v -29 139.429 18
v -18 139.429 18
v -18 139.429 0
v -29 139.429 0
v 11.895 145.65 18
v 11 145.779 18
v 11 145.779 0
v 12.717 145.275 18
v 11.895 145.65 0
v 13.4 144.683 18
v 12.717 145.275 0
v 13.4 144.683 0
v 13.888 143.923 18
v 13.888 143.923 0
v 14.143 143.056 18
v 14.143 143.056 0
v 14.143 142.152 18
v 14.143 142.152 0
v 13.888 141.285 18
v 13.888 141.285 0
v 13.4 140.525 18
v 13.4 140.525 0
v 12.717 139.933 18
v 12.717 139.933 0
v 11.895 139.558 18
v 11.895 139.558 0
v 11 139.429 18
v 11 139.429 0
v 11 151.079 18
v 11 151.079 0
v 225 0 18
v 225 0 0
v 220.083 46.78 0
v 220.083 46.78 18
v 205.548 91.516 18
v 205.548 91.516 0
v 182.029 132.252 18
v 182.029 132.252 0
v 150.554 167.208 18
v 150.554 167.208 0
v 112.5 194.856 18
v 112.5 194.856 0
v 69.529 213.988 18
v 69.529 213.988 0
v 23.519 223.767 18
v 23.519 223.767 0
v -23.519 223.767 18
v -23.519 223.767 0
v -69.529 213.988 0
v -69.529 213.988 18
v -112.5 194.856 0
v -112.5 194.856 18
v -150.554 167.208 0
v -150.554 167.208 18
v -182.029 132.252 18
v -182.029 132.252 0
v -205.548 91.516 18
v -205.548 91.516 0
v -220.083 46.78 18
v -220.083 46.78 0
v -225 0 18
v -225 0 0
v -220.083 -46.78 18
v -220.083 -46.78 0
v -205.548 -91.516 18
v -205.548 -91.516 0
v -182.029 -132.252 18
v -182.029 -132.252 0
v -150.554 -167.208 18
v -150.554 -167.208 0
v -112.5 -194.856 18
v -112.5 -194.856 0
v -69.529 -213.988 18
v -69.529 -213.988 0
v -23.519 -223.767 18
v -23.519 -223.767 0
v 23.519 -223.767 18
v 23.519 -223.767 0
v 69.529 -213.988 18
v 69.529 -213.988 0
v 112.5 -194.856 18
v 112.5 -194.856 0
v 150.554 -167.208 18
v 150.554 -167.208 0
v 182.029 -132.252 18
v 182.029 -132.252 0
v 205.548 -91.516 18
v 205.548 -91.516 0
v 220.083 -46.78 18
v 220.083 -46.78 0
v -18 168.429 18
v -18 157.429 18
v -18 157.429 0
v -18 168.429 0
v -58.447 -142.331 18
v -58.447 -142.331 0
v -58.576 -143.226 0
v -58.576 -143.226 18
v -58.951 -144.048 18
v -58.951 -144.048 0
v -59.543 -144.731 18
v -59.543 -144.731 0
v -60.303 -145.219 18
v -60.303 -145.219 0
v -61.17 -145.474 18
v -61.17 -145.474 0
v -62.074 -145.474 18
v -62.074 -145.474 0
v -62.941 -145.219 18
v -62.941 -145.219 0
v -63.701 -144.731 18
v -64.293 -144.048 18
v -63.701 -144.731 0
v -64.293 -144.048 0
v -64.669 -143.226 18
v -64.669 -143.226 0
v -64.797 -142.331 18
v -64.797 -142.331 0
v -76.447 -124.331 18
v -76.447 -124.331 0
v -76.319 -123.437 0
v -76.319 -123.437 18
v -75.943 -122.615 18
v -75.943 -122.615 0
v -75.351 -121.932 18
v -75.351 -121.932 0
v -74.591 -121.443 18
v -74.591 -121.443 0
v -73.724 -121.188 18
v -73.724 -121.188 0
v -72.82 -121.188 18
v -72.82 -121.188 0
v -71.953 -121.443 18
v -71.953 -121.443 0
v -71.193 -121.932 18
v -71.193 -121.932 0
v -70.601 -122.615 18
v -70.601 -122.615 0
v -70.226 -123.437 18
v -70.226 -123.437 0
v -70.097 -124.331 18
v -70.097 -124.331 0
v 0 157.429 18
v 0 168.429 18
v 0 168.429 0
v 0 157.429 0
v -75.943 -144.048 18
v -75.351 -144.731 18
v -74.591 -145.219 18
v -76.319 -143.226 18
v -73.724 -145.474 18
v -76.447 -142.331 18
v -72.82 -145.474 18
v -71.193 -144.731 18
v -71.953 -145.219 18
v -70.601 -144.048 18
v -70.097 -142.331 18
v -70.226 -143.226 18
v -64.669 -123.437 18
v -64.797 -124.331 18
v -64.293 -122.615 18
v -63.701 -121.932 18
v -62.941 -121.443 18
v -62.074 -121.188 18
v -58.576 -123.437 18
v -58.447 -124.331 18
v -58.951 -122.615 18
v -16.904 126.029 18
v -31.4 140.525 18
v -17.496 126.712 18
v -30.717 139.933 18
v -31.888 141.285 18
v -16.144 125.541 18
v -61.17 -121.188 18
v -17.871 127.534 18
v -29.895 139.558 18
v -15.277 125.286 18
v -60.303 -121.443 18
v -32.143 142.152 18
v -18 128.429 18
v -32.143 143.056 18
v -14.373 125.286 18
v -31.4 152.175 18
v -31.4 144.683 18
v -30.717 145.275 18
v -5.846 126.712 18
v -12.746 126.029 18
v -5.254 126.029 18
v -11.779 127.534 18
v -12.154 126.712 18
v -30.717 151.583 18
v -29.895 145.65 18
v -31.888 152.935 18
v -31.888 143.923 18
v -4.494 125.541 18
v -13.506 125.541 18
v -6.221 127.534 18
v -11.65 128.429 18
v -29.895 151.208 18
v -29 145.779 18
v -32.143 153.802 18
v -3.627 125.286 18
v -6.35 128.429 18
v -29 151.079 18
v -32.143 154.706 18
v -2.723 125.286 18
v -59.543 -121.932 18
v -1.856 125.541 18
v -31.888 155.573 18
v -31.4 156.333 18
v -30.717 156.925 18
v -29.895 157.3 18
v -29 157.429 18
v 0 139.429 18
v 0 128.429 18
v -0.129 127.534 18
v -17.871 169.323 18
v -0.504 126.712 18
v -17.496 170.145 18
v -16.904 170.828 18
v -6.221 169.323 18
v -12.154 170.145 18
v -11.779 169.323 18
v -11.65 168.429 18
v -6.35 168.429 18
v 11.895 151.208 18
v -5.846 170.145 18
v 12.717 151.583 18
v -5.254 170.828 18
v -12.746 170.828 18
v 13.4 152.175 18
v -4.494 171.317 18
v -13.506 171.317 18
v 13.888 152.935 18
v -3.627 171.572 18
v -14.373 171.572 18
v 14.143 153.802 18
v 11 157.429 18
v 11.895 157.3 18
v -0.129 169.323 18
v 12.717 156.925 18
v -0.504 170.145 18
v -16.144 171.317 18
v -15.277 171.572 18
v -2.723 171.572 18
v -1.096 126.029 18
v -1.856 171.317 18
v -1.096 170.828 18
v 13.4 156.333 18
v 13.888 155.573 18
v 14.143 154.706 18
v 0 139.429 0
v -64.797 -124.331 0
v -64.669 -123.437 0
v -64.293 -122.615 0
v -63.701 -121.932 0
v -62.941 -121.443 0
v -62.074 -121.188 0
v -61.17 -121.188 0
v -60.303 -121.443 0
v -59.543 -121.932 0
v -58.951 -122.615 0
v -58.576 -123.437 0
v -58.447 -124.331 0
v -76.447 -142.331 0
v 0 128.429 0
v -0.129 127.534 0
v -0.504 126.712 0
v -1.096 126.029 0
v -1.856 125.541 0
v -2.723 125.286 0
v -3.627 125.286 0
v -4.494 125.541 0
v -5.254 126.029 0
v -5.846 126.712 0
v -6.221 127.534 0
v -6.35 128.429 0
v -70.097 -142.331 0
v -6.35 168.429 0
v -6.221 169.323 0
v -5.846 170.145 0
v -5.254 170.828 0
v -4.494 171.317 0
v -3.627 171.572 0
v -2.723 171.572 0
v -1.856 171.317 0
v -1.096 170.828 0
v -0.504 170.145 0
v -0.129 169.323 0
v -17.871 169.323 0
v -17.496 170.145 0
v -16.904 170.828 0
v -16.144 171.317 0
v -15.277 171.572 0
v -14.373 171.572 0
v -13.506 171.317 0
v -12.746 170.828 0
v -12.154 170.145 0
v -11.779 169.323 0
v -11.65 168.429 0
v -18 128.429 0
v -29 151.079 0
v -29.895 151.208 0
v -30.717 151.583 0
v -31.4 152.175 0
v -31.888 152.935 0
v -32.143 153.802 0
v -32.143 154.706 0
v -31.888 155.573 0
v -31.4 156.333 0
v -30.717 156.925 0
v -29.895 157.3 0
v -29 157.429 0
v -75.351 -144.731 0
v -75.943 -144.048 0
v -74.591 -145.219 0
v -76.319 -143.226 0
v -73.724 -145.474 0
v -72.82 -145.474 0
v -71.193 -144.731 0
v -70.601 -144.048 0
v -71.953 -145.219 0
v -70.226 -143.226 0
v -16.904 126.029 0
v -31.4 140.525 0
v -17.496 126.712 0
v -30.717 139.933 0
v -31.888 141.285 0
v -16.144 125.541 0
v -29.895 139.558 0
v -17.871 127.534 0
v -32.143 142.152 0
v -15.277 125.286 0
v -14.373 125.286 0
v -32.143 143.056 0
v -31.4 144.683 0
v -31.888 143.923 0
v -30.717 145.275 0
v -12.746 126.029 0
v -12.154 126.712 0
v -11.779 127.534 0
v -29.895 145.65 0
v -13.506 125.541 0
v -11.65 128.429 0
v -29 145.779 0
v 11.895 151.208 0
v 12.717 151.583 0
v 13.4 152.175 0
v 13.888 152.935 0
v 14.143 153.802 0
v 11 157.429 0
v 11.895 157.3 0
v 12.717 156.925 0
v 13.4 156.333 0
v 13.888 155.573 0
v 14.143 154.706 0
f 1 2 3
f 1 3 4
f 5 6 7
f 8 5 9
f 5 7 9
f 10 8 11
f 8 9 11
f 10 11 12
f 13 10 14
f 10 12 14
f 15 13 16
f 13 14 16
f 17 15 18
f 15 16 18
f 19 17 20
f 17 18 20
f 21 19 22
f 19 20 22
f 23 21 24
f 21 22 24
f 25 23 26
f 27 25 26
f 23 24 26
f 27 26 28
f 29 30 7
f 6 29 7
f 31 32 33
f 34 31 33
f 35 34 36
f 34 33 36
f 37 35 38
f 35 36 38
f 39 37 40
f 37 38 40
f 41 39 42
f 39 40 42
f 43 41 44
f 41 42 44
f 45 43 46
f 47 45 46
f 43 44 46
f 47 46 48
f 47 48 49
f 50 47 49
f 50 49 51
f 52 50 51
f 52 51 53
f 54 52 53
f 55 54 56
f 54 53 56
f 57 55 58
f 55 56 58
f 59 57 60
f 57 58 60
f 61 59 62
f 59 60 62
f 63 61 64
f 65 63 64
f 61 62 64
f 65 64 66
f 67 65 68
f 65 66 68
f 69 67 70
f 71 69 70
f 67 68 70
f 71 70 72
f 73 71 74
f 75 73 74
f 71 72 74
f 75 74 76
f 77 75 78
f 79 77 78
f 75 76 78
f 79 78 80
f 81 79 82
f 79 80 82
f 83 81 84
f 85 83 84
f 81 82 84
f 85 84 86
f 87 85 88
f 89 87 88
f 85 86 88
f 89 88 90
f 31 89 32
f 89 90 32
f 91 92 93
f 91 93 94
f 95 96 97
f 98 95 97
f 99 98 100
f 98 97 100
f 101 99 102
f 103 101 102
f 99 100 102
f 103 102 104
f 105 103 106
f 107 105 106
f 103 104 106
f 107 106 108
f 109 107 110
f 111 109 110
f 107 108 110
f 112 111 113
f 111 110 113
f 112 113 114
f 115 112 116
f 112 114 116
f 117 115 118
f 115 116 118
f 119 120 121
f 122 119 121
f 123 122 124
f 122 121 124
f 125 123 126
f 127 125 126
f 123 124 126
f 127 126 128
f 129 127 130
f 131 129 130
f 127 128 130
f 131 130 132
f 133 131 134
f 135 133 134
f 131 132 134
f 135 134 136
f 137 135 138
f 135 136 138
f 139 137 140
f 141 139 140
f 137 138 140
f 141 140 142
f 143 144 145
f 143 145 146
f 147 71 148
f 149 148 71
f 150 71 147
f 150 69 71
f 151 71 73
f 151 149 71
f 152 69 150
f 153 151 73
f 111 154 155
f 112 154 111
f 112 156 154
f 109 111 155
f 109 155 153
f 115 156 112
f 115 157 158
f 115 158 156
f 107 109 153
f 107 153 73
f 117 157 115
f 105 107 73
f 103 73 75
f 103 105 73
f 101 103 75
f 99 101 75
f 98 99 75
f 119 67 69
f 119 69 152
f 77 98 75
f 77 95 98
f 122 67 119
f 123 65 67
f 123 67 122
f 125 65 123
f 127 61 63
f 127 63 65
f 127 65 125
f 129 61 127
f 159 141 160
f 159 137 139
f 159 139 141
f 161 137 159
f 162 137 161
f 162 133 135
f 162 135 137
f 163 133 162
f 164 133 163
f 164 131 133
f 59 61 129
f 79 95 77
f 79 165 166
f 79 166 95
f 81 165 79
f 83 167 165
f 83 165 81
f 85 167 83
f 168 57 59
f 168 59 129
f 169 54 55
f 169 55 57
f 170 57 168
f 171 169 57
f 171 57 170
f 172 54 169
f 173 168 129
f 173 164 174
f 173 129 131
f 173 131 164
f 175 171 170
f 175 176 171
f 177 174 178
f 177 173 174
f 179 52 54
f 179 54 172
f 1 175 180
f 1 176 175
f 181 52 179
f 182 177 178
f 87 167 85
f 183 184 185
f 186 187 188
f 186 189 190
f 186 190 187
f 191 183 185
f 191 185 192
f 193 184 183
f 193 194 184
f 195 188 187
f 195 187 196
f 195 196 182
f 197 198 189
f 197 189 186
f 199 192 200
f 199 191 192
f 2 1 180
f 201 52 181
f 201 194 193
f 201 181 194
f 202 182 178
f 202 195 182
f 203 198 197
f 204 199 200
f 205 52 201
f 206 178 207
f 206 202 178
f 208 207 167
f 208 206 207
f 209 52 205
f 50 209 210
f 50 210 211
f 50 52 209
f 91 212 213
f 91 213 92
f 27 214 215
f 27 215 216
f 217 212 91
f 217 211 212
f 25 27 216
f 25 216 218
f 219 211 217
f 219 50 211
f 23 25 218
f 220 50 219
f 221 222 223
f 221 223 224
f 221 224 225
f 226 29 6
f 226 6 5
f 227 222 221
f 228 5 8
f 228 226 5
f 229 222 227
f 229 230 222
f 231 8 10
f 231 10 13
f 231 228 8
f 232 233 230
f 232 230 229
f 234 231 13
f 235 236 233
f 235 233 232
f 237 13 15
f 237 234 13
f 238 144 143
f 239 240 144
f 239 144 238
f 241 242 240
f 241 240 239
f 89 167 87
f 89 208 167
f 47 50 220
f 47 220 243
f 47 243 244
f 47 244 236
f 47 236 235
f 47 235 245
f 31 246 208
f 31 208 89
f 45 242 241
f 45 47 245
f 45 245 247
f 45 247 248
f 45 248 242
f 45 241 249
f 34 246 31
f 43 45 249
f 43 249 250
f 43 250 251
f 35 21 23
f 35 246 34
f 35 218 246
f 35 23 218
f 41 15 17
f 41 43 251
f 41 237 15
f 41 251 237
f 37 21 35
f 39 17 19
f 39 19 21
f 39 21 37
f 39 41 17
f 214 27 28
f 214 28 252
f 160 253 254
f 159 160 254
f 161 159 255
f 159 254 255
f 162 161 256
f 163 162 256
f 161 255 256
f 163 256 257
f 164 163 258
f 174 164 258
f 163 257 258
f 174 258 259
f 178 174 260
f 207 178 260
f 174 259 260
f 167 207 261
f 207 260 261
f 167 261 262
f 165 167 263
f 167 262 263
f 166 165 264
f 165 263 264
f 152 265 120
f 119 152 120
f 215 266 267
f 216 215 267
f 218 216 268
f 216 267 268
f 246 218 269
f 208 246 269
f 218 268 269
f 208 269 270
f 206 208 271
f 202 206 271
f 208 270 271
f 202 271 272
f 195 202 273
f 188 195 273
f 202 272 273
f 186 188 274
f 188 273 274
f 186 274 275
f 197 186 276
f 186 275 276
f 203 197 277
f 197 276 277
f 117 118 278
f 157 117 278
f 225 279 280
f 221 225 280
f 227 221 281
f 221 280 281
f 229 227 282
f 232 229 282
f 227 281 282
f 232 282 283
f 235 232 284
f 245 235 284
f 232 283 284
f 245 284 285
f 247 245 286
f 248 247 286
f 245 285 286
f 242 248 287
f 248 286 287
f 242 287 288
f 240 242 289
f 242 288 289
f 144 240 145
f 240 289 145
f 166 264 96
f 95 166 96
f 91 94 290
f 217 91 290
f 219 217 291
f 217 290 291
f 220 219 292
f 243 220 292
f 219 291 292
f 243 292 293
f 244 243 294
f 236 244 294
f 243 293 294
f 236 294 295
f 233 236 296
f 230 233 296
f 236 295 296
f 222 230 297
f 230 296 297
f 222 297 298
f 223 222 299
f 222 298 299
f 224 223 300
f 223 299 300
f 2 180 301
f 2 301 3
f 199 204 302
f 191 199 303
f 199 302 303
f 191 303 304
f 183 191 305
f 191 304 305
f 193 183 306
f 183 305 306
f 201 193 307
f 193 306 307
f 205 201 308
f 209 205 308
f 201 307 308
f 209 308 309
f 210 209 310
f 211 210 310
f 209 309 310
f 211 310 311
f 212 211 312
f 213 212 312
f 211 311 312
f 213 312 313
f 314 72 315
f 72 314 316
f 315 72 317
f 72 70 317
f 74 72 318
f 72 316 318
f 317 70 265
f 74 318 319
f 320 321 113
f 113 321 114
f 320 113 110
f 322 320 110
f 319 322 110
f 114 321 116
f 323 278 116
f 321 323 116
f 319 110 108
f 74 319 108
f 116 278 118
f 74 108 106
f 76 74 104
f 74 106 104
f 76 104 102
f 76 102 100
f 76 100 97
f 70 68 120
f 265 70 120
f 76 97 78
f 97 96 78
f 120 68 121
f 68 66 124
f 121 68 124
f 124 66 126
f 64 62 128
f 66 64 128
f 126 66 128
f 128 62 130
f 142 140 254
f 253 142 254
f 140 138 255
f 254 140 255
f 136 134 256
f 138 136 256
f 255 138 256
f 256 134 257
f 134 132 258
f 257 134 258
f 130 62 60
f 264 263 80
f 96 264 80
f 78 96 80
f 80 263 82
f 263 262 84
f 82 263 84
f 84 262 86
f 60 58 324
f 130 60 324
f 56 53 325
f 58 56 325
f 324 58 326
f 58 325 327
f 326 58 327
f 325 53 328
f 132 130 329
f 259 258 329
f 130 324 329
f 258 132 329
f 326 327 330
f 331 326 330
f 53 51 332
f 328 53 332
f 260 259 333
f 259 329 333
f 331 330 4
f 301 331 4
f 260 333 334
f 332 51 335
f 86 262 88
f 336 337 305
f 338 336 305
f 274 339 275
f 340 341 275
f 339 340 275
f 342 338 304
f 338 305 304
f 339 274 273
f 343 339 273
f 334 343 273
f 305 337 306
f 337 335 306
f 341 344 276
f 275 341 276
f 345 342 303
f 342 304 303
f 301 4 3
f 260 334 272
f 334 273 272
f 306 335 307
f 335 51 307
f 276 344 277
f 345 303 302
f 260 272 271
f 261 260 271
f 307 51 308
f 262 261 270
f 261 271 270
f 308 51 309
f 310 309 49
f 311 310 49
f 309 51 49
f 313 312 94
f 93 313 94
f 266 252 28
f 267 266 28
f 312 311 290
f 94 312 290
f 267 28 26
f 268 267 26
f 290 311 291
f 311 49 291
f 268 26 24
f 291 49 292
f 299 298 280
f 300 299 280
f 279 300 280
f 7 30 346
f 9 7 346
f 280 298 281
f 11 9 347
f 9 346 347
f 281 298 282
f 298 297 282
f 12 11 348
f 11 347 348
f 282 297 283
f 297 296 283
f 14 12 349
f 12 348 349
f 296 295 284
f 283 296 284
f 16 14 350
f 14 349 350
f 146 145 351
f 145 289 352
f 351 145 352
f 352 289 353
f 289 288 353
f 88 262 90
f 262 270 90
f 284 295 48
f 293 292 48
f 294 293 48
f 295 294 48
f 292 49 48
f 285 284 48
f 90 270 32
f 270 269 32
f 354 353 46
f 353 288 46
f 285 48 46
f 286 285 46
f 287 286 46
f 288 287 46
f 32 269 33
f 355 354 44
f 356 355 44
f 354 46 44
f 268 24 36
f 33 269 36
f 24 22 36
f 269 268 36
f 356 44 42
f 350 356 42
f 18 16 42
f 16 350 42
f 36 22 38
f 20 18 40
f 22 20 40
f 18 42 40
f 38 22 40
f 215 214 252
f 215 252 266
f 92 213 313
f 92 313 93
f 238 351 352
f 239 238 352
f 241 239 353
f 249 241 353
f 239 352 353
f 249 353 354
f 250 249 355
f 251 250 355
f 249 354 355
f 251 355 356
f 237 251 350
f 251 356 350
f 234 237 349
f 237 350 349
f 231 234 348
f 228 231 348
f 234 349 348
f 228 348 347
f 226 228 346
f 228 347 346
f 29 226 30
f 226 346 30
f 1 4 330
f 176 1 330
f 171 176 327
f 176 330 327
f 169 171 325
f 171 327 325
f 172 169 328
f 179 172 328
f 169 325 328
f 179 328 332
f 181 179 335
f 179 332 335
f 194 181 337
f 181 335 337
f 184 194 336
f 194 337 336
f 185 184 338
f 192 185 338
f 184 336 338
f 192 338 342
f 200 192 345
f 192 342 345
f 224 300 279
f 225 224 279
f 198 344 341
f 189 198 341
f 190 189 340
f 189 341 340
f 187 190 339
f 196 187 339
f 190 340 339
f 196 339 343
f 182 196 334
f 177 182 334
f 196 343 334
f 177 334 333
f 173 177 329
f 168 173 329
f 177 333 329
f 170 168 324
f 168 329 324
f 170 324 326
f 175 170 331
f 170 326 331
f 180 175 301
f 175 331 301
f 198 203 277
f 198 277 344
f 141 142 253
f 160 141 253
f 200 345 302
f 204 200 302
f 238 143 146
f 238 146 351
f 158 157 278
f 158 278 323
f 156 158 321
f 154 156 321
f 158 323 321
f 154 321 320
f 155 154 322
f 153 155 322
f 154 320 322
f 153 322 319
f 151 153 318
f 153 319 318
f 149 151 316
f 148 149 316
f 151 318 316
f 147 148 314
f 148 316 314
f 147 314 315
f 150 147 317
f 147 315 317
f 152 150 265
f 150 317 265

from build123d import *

# Parameters (mm, degrees)
SCHIZZO1_R                   = 225
ESTRUSIONE_ESTRUSIONE1_DEPTH = 18
TAGLIO_ESTRUSIONE3_DEPTH     = 56
TAGLIO_ESTRUSIONE4_DEPTH     = 110


with BuildPart() as part:
    # Schizzo1 → Estrusione-Estrusione1 (new body)
    with BuildSketch(Plane.XY):
        Circle(SCHIZZO1_R)
    extrude(amount=ESTRUSIONE_ESTRUSIONE1_DEPTH)

    # Schizzo1<7> → Taglio-Estrusione3 (cut)
    with BuildSketch(Plane.XY):
        with BuildLine():
            Line((-11.65, 168.428927822), (-6.35, 168.428927822))
            ThreePointArc((-6.35, 168.428927822), (-3.175, 171.603927822), (0, 168.428927822))
            Line((0, 168.428927822), (0, 157.428927822))
            Line((0, 157.428927822), (11, 157.428927822))
            ThreePointArc((11, 157.428927822), (14.175, 154.253927822), (11, 151.078927822))
            Line((11, 151.078927822), (11, 145.778927822))
            ThreePointArc((11, 145.778927822), (14.175, 142.603927822), (11, 139.428927822))
            Line((11, 139.428927822), (0, 139.428927822))
            Line((0, 139.428927822), (0, 128.428927822))
            ThreePointArc((0, 128.428927822), (-3.175, 125.253927822), (-6.35, 128.428927822))
            Line((-6.35, 128.428927822), (-11.65, 128.428927822))
            ThreePointArc((-11.65, 128.428927822), (-14.825, 125.253927822), (-18, 128.428927822))
            Line((-18, 128.428927822), (-18, 139.428927822))
            Line((-18, 139.428927822), (-29, 139.428927822))
            ThreePointArc((-29, 139.428927822), (-32.175, 142.603927822), (-29, 145.778927822))
            Line((-29, 145.778927822), (-29, 151.078927822))
            ThreePointArc((-29, 151.078927822), (-32.175, 154.253927822), (-29, 157.428927822))
            Line((-29, 157.428927822), (-18, 157.428927822))
            Line((-18, 157.428927822), (-18, 168.428927822))
            ThreePointArc((-18, 168.428927822), (-14.825, 171.603927822), (-11.65, 168.428927822))
        make_face()
    extrude(amount=TAGLIO_ESTRUSIONE3_DEPTH, mode=Mode.SUBTRACT)

    # Schizzo1<8> → Taglio-Estrusione4 (cut)
    with BuildSketch(Plane.XY):
        with BuildLine():
            Line((-70.097292154, -124.331072178), (-64.797292154, -124.331072178))
            ThreePointArc((-64.797292154, -124.331072178), (-61.622292154, -121.156072178), (-58.447292154, -124.331072178))
            Line((-58.447292154, -124.331072178), (-58.447292154, -142.331072178))
            ThreePointArc((-58.447292154, -142.331072178), (-61.622292154, -145.506072178), (-64.797292154, -142.331072178))
            Line((-64.797292154, -142.331072178), (-70.097292154, -142.331072178))
            ThreePointArc((-70.097292154, -142.331072178), (-73.272292154, -145.506072178), (-76.447292154, -142.331072178))
            Line((-76.447292154, -142.331072178), (-76.447292154, -124.331072178))
            ThreePointArc((-76.447292154, -124.331072178), (-73.272292154, -121.156072178), (-70.097292154, -124.331072178))
        make_face()
    extrude(amount=TAGLIO_ESTRUSIONE4_DEPTH, mode=Mode.SUBTRACT)


solid = part.part
